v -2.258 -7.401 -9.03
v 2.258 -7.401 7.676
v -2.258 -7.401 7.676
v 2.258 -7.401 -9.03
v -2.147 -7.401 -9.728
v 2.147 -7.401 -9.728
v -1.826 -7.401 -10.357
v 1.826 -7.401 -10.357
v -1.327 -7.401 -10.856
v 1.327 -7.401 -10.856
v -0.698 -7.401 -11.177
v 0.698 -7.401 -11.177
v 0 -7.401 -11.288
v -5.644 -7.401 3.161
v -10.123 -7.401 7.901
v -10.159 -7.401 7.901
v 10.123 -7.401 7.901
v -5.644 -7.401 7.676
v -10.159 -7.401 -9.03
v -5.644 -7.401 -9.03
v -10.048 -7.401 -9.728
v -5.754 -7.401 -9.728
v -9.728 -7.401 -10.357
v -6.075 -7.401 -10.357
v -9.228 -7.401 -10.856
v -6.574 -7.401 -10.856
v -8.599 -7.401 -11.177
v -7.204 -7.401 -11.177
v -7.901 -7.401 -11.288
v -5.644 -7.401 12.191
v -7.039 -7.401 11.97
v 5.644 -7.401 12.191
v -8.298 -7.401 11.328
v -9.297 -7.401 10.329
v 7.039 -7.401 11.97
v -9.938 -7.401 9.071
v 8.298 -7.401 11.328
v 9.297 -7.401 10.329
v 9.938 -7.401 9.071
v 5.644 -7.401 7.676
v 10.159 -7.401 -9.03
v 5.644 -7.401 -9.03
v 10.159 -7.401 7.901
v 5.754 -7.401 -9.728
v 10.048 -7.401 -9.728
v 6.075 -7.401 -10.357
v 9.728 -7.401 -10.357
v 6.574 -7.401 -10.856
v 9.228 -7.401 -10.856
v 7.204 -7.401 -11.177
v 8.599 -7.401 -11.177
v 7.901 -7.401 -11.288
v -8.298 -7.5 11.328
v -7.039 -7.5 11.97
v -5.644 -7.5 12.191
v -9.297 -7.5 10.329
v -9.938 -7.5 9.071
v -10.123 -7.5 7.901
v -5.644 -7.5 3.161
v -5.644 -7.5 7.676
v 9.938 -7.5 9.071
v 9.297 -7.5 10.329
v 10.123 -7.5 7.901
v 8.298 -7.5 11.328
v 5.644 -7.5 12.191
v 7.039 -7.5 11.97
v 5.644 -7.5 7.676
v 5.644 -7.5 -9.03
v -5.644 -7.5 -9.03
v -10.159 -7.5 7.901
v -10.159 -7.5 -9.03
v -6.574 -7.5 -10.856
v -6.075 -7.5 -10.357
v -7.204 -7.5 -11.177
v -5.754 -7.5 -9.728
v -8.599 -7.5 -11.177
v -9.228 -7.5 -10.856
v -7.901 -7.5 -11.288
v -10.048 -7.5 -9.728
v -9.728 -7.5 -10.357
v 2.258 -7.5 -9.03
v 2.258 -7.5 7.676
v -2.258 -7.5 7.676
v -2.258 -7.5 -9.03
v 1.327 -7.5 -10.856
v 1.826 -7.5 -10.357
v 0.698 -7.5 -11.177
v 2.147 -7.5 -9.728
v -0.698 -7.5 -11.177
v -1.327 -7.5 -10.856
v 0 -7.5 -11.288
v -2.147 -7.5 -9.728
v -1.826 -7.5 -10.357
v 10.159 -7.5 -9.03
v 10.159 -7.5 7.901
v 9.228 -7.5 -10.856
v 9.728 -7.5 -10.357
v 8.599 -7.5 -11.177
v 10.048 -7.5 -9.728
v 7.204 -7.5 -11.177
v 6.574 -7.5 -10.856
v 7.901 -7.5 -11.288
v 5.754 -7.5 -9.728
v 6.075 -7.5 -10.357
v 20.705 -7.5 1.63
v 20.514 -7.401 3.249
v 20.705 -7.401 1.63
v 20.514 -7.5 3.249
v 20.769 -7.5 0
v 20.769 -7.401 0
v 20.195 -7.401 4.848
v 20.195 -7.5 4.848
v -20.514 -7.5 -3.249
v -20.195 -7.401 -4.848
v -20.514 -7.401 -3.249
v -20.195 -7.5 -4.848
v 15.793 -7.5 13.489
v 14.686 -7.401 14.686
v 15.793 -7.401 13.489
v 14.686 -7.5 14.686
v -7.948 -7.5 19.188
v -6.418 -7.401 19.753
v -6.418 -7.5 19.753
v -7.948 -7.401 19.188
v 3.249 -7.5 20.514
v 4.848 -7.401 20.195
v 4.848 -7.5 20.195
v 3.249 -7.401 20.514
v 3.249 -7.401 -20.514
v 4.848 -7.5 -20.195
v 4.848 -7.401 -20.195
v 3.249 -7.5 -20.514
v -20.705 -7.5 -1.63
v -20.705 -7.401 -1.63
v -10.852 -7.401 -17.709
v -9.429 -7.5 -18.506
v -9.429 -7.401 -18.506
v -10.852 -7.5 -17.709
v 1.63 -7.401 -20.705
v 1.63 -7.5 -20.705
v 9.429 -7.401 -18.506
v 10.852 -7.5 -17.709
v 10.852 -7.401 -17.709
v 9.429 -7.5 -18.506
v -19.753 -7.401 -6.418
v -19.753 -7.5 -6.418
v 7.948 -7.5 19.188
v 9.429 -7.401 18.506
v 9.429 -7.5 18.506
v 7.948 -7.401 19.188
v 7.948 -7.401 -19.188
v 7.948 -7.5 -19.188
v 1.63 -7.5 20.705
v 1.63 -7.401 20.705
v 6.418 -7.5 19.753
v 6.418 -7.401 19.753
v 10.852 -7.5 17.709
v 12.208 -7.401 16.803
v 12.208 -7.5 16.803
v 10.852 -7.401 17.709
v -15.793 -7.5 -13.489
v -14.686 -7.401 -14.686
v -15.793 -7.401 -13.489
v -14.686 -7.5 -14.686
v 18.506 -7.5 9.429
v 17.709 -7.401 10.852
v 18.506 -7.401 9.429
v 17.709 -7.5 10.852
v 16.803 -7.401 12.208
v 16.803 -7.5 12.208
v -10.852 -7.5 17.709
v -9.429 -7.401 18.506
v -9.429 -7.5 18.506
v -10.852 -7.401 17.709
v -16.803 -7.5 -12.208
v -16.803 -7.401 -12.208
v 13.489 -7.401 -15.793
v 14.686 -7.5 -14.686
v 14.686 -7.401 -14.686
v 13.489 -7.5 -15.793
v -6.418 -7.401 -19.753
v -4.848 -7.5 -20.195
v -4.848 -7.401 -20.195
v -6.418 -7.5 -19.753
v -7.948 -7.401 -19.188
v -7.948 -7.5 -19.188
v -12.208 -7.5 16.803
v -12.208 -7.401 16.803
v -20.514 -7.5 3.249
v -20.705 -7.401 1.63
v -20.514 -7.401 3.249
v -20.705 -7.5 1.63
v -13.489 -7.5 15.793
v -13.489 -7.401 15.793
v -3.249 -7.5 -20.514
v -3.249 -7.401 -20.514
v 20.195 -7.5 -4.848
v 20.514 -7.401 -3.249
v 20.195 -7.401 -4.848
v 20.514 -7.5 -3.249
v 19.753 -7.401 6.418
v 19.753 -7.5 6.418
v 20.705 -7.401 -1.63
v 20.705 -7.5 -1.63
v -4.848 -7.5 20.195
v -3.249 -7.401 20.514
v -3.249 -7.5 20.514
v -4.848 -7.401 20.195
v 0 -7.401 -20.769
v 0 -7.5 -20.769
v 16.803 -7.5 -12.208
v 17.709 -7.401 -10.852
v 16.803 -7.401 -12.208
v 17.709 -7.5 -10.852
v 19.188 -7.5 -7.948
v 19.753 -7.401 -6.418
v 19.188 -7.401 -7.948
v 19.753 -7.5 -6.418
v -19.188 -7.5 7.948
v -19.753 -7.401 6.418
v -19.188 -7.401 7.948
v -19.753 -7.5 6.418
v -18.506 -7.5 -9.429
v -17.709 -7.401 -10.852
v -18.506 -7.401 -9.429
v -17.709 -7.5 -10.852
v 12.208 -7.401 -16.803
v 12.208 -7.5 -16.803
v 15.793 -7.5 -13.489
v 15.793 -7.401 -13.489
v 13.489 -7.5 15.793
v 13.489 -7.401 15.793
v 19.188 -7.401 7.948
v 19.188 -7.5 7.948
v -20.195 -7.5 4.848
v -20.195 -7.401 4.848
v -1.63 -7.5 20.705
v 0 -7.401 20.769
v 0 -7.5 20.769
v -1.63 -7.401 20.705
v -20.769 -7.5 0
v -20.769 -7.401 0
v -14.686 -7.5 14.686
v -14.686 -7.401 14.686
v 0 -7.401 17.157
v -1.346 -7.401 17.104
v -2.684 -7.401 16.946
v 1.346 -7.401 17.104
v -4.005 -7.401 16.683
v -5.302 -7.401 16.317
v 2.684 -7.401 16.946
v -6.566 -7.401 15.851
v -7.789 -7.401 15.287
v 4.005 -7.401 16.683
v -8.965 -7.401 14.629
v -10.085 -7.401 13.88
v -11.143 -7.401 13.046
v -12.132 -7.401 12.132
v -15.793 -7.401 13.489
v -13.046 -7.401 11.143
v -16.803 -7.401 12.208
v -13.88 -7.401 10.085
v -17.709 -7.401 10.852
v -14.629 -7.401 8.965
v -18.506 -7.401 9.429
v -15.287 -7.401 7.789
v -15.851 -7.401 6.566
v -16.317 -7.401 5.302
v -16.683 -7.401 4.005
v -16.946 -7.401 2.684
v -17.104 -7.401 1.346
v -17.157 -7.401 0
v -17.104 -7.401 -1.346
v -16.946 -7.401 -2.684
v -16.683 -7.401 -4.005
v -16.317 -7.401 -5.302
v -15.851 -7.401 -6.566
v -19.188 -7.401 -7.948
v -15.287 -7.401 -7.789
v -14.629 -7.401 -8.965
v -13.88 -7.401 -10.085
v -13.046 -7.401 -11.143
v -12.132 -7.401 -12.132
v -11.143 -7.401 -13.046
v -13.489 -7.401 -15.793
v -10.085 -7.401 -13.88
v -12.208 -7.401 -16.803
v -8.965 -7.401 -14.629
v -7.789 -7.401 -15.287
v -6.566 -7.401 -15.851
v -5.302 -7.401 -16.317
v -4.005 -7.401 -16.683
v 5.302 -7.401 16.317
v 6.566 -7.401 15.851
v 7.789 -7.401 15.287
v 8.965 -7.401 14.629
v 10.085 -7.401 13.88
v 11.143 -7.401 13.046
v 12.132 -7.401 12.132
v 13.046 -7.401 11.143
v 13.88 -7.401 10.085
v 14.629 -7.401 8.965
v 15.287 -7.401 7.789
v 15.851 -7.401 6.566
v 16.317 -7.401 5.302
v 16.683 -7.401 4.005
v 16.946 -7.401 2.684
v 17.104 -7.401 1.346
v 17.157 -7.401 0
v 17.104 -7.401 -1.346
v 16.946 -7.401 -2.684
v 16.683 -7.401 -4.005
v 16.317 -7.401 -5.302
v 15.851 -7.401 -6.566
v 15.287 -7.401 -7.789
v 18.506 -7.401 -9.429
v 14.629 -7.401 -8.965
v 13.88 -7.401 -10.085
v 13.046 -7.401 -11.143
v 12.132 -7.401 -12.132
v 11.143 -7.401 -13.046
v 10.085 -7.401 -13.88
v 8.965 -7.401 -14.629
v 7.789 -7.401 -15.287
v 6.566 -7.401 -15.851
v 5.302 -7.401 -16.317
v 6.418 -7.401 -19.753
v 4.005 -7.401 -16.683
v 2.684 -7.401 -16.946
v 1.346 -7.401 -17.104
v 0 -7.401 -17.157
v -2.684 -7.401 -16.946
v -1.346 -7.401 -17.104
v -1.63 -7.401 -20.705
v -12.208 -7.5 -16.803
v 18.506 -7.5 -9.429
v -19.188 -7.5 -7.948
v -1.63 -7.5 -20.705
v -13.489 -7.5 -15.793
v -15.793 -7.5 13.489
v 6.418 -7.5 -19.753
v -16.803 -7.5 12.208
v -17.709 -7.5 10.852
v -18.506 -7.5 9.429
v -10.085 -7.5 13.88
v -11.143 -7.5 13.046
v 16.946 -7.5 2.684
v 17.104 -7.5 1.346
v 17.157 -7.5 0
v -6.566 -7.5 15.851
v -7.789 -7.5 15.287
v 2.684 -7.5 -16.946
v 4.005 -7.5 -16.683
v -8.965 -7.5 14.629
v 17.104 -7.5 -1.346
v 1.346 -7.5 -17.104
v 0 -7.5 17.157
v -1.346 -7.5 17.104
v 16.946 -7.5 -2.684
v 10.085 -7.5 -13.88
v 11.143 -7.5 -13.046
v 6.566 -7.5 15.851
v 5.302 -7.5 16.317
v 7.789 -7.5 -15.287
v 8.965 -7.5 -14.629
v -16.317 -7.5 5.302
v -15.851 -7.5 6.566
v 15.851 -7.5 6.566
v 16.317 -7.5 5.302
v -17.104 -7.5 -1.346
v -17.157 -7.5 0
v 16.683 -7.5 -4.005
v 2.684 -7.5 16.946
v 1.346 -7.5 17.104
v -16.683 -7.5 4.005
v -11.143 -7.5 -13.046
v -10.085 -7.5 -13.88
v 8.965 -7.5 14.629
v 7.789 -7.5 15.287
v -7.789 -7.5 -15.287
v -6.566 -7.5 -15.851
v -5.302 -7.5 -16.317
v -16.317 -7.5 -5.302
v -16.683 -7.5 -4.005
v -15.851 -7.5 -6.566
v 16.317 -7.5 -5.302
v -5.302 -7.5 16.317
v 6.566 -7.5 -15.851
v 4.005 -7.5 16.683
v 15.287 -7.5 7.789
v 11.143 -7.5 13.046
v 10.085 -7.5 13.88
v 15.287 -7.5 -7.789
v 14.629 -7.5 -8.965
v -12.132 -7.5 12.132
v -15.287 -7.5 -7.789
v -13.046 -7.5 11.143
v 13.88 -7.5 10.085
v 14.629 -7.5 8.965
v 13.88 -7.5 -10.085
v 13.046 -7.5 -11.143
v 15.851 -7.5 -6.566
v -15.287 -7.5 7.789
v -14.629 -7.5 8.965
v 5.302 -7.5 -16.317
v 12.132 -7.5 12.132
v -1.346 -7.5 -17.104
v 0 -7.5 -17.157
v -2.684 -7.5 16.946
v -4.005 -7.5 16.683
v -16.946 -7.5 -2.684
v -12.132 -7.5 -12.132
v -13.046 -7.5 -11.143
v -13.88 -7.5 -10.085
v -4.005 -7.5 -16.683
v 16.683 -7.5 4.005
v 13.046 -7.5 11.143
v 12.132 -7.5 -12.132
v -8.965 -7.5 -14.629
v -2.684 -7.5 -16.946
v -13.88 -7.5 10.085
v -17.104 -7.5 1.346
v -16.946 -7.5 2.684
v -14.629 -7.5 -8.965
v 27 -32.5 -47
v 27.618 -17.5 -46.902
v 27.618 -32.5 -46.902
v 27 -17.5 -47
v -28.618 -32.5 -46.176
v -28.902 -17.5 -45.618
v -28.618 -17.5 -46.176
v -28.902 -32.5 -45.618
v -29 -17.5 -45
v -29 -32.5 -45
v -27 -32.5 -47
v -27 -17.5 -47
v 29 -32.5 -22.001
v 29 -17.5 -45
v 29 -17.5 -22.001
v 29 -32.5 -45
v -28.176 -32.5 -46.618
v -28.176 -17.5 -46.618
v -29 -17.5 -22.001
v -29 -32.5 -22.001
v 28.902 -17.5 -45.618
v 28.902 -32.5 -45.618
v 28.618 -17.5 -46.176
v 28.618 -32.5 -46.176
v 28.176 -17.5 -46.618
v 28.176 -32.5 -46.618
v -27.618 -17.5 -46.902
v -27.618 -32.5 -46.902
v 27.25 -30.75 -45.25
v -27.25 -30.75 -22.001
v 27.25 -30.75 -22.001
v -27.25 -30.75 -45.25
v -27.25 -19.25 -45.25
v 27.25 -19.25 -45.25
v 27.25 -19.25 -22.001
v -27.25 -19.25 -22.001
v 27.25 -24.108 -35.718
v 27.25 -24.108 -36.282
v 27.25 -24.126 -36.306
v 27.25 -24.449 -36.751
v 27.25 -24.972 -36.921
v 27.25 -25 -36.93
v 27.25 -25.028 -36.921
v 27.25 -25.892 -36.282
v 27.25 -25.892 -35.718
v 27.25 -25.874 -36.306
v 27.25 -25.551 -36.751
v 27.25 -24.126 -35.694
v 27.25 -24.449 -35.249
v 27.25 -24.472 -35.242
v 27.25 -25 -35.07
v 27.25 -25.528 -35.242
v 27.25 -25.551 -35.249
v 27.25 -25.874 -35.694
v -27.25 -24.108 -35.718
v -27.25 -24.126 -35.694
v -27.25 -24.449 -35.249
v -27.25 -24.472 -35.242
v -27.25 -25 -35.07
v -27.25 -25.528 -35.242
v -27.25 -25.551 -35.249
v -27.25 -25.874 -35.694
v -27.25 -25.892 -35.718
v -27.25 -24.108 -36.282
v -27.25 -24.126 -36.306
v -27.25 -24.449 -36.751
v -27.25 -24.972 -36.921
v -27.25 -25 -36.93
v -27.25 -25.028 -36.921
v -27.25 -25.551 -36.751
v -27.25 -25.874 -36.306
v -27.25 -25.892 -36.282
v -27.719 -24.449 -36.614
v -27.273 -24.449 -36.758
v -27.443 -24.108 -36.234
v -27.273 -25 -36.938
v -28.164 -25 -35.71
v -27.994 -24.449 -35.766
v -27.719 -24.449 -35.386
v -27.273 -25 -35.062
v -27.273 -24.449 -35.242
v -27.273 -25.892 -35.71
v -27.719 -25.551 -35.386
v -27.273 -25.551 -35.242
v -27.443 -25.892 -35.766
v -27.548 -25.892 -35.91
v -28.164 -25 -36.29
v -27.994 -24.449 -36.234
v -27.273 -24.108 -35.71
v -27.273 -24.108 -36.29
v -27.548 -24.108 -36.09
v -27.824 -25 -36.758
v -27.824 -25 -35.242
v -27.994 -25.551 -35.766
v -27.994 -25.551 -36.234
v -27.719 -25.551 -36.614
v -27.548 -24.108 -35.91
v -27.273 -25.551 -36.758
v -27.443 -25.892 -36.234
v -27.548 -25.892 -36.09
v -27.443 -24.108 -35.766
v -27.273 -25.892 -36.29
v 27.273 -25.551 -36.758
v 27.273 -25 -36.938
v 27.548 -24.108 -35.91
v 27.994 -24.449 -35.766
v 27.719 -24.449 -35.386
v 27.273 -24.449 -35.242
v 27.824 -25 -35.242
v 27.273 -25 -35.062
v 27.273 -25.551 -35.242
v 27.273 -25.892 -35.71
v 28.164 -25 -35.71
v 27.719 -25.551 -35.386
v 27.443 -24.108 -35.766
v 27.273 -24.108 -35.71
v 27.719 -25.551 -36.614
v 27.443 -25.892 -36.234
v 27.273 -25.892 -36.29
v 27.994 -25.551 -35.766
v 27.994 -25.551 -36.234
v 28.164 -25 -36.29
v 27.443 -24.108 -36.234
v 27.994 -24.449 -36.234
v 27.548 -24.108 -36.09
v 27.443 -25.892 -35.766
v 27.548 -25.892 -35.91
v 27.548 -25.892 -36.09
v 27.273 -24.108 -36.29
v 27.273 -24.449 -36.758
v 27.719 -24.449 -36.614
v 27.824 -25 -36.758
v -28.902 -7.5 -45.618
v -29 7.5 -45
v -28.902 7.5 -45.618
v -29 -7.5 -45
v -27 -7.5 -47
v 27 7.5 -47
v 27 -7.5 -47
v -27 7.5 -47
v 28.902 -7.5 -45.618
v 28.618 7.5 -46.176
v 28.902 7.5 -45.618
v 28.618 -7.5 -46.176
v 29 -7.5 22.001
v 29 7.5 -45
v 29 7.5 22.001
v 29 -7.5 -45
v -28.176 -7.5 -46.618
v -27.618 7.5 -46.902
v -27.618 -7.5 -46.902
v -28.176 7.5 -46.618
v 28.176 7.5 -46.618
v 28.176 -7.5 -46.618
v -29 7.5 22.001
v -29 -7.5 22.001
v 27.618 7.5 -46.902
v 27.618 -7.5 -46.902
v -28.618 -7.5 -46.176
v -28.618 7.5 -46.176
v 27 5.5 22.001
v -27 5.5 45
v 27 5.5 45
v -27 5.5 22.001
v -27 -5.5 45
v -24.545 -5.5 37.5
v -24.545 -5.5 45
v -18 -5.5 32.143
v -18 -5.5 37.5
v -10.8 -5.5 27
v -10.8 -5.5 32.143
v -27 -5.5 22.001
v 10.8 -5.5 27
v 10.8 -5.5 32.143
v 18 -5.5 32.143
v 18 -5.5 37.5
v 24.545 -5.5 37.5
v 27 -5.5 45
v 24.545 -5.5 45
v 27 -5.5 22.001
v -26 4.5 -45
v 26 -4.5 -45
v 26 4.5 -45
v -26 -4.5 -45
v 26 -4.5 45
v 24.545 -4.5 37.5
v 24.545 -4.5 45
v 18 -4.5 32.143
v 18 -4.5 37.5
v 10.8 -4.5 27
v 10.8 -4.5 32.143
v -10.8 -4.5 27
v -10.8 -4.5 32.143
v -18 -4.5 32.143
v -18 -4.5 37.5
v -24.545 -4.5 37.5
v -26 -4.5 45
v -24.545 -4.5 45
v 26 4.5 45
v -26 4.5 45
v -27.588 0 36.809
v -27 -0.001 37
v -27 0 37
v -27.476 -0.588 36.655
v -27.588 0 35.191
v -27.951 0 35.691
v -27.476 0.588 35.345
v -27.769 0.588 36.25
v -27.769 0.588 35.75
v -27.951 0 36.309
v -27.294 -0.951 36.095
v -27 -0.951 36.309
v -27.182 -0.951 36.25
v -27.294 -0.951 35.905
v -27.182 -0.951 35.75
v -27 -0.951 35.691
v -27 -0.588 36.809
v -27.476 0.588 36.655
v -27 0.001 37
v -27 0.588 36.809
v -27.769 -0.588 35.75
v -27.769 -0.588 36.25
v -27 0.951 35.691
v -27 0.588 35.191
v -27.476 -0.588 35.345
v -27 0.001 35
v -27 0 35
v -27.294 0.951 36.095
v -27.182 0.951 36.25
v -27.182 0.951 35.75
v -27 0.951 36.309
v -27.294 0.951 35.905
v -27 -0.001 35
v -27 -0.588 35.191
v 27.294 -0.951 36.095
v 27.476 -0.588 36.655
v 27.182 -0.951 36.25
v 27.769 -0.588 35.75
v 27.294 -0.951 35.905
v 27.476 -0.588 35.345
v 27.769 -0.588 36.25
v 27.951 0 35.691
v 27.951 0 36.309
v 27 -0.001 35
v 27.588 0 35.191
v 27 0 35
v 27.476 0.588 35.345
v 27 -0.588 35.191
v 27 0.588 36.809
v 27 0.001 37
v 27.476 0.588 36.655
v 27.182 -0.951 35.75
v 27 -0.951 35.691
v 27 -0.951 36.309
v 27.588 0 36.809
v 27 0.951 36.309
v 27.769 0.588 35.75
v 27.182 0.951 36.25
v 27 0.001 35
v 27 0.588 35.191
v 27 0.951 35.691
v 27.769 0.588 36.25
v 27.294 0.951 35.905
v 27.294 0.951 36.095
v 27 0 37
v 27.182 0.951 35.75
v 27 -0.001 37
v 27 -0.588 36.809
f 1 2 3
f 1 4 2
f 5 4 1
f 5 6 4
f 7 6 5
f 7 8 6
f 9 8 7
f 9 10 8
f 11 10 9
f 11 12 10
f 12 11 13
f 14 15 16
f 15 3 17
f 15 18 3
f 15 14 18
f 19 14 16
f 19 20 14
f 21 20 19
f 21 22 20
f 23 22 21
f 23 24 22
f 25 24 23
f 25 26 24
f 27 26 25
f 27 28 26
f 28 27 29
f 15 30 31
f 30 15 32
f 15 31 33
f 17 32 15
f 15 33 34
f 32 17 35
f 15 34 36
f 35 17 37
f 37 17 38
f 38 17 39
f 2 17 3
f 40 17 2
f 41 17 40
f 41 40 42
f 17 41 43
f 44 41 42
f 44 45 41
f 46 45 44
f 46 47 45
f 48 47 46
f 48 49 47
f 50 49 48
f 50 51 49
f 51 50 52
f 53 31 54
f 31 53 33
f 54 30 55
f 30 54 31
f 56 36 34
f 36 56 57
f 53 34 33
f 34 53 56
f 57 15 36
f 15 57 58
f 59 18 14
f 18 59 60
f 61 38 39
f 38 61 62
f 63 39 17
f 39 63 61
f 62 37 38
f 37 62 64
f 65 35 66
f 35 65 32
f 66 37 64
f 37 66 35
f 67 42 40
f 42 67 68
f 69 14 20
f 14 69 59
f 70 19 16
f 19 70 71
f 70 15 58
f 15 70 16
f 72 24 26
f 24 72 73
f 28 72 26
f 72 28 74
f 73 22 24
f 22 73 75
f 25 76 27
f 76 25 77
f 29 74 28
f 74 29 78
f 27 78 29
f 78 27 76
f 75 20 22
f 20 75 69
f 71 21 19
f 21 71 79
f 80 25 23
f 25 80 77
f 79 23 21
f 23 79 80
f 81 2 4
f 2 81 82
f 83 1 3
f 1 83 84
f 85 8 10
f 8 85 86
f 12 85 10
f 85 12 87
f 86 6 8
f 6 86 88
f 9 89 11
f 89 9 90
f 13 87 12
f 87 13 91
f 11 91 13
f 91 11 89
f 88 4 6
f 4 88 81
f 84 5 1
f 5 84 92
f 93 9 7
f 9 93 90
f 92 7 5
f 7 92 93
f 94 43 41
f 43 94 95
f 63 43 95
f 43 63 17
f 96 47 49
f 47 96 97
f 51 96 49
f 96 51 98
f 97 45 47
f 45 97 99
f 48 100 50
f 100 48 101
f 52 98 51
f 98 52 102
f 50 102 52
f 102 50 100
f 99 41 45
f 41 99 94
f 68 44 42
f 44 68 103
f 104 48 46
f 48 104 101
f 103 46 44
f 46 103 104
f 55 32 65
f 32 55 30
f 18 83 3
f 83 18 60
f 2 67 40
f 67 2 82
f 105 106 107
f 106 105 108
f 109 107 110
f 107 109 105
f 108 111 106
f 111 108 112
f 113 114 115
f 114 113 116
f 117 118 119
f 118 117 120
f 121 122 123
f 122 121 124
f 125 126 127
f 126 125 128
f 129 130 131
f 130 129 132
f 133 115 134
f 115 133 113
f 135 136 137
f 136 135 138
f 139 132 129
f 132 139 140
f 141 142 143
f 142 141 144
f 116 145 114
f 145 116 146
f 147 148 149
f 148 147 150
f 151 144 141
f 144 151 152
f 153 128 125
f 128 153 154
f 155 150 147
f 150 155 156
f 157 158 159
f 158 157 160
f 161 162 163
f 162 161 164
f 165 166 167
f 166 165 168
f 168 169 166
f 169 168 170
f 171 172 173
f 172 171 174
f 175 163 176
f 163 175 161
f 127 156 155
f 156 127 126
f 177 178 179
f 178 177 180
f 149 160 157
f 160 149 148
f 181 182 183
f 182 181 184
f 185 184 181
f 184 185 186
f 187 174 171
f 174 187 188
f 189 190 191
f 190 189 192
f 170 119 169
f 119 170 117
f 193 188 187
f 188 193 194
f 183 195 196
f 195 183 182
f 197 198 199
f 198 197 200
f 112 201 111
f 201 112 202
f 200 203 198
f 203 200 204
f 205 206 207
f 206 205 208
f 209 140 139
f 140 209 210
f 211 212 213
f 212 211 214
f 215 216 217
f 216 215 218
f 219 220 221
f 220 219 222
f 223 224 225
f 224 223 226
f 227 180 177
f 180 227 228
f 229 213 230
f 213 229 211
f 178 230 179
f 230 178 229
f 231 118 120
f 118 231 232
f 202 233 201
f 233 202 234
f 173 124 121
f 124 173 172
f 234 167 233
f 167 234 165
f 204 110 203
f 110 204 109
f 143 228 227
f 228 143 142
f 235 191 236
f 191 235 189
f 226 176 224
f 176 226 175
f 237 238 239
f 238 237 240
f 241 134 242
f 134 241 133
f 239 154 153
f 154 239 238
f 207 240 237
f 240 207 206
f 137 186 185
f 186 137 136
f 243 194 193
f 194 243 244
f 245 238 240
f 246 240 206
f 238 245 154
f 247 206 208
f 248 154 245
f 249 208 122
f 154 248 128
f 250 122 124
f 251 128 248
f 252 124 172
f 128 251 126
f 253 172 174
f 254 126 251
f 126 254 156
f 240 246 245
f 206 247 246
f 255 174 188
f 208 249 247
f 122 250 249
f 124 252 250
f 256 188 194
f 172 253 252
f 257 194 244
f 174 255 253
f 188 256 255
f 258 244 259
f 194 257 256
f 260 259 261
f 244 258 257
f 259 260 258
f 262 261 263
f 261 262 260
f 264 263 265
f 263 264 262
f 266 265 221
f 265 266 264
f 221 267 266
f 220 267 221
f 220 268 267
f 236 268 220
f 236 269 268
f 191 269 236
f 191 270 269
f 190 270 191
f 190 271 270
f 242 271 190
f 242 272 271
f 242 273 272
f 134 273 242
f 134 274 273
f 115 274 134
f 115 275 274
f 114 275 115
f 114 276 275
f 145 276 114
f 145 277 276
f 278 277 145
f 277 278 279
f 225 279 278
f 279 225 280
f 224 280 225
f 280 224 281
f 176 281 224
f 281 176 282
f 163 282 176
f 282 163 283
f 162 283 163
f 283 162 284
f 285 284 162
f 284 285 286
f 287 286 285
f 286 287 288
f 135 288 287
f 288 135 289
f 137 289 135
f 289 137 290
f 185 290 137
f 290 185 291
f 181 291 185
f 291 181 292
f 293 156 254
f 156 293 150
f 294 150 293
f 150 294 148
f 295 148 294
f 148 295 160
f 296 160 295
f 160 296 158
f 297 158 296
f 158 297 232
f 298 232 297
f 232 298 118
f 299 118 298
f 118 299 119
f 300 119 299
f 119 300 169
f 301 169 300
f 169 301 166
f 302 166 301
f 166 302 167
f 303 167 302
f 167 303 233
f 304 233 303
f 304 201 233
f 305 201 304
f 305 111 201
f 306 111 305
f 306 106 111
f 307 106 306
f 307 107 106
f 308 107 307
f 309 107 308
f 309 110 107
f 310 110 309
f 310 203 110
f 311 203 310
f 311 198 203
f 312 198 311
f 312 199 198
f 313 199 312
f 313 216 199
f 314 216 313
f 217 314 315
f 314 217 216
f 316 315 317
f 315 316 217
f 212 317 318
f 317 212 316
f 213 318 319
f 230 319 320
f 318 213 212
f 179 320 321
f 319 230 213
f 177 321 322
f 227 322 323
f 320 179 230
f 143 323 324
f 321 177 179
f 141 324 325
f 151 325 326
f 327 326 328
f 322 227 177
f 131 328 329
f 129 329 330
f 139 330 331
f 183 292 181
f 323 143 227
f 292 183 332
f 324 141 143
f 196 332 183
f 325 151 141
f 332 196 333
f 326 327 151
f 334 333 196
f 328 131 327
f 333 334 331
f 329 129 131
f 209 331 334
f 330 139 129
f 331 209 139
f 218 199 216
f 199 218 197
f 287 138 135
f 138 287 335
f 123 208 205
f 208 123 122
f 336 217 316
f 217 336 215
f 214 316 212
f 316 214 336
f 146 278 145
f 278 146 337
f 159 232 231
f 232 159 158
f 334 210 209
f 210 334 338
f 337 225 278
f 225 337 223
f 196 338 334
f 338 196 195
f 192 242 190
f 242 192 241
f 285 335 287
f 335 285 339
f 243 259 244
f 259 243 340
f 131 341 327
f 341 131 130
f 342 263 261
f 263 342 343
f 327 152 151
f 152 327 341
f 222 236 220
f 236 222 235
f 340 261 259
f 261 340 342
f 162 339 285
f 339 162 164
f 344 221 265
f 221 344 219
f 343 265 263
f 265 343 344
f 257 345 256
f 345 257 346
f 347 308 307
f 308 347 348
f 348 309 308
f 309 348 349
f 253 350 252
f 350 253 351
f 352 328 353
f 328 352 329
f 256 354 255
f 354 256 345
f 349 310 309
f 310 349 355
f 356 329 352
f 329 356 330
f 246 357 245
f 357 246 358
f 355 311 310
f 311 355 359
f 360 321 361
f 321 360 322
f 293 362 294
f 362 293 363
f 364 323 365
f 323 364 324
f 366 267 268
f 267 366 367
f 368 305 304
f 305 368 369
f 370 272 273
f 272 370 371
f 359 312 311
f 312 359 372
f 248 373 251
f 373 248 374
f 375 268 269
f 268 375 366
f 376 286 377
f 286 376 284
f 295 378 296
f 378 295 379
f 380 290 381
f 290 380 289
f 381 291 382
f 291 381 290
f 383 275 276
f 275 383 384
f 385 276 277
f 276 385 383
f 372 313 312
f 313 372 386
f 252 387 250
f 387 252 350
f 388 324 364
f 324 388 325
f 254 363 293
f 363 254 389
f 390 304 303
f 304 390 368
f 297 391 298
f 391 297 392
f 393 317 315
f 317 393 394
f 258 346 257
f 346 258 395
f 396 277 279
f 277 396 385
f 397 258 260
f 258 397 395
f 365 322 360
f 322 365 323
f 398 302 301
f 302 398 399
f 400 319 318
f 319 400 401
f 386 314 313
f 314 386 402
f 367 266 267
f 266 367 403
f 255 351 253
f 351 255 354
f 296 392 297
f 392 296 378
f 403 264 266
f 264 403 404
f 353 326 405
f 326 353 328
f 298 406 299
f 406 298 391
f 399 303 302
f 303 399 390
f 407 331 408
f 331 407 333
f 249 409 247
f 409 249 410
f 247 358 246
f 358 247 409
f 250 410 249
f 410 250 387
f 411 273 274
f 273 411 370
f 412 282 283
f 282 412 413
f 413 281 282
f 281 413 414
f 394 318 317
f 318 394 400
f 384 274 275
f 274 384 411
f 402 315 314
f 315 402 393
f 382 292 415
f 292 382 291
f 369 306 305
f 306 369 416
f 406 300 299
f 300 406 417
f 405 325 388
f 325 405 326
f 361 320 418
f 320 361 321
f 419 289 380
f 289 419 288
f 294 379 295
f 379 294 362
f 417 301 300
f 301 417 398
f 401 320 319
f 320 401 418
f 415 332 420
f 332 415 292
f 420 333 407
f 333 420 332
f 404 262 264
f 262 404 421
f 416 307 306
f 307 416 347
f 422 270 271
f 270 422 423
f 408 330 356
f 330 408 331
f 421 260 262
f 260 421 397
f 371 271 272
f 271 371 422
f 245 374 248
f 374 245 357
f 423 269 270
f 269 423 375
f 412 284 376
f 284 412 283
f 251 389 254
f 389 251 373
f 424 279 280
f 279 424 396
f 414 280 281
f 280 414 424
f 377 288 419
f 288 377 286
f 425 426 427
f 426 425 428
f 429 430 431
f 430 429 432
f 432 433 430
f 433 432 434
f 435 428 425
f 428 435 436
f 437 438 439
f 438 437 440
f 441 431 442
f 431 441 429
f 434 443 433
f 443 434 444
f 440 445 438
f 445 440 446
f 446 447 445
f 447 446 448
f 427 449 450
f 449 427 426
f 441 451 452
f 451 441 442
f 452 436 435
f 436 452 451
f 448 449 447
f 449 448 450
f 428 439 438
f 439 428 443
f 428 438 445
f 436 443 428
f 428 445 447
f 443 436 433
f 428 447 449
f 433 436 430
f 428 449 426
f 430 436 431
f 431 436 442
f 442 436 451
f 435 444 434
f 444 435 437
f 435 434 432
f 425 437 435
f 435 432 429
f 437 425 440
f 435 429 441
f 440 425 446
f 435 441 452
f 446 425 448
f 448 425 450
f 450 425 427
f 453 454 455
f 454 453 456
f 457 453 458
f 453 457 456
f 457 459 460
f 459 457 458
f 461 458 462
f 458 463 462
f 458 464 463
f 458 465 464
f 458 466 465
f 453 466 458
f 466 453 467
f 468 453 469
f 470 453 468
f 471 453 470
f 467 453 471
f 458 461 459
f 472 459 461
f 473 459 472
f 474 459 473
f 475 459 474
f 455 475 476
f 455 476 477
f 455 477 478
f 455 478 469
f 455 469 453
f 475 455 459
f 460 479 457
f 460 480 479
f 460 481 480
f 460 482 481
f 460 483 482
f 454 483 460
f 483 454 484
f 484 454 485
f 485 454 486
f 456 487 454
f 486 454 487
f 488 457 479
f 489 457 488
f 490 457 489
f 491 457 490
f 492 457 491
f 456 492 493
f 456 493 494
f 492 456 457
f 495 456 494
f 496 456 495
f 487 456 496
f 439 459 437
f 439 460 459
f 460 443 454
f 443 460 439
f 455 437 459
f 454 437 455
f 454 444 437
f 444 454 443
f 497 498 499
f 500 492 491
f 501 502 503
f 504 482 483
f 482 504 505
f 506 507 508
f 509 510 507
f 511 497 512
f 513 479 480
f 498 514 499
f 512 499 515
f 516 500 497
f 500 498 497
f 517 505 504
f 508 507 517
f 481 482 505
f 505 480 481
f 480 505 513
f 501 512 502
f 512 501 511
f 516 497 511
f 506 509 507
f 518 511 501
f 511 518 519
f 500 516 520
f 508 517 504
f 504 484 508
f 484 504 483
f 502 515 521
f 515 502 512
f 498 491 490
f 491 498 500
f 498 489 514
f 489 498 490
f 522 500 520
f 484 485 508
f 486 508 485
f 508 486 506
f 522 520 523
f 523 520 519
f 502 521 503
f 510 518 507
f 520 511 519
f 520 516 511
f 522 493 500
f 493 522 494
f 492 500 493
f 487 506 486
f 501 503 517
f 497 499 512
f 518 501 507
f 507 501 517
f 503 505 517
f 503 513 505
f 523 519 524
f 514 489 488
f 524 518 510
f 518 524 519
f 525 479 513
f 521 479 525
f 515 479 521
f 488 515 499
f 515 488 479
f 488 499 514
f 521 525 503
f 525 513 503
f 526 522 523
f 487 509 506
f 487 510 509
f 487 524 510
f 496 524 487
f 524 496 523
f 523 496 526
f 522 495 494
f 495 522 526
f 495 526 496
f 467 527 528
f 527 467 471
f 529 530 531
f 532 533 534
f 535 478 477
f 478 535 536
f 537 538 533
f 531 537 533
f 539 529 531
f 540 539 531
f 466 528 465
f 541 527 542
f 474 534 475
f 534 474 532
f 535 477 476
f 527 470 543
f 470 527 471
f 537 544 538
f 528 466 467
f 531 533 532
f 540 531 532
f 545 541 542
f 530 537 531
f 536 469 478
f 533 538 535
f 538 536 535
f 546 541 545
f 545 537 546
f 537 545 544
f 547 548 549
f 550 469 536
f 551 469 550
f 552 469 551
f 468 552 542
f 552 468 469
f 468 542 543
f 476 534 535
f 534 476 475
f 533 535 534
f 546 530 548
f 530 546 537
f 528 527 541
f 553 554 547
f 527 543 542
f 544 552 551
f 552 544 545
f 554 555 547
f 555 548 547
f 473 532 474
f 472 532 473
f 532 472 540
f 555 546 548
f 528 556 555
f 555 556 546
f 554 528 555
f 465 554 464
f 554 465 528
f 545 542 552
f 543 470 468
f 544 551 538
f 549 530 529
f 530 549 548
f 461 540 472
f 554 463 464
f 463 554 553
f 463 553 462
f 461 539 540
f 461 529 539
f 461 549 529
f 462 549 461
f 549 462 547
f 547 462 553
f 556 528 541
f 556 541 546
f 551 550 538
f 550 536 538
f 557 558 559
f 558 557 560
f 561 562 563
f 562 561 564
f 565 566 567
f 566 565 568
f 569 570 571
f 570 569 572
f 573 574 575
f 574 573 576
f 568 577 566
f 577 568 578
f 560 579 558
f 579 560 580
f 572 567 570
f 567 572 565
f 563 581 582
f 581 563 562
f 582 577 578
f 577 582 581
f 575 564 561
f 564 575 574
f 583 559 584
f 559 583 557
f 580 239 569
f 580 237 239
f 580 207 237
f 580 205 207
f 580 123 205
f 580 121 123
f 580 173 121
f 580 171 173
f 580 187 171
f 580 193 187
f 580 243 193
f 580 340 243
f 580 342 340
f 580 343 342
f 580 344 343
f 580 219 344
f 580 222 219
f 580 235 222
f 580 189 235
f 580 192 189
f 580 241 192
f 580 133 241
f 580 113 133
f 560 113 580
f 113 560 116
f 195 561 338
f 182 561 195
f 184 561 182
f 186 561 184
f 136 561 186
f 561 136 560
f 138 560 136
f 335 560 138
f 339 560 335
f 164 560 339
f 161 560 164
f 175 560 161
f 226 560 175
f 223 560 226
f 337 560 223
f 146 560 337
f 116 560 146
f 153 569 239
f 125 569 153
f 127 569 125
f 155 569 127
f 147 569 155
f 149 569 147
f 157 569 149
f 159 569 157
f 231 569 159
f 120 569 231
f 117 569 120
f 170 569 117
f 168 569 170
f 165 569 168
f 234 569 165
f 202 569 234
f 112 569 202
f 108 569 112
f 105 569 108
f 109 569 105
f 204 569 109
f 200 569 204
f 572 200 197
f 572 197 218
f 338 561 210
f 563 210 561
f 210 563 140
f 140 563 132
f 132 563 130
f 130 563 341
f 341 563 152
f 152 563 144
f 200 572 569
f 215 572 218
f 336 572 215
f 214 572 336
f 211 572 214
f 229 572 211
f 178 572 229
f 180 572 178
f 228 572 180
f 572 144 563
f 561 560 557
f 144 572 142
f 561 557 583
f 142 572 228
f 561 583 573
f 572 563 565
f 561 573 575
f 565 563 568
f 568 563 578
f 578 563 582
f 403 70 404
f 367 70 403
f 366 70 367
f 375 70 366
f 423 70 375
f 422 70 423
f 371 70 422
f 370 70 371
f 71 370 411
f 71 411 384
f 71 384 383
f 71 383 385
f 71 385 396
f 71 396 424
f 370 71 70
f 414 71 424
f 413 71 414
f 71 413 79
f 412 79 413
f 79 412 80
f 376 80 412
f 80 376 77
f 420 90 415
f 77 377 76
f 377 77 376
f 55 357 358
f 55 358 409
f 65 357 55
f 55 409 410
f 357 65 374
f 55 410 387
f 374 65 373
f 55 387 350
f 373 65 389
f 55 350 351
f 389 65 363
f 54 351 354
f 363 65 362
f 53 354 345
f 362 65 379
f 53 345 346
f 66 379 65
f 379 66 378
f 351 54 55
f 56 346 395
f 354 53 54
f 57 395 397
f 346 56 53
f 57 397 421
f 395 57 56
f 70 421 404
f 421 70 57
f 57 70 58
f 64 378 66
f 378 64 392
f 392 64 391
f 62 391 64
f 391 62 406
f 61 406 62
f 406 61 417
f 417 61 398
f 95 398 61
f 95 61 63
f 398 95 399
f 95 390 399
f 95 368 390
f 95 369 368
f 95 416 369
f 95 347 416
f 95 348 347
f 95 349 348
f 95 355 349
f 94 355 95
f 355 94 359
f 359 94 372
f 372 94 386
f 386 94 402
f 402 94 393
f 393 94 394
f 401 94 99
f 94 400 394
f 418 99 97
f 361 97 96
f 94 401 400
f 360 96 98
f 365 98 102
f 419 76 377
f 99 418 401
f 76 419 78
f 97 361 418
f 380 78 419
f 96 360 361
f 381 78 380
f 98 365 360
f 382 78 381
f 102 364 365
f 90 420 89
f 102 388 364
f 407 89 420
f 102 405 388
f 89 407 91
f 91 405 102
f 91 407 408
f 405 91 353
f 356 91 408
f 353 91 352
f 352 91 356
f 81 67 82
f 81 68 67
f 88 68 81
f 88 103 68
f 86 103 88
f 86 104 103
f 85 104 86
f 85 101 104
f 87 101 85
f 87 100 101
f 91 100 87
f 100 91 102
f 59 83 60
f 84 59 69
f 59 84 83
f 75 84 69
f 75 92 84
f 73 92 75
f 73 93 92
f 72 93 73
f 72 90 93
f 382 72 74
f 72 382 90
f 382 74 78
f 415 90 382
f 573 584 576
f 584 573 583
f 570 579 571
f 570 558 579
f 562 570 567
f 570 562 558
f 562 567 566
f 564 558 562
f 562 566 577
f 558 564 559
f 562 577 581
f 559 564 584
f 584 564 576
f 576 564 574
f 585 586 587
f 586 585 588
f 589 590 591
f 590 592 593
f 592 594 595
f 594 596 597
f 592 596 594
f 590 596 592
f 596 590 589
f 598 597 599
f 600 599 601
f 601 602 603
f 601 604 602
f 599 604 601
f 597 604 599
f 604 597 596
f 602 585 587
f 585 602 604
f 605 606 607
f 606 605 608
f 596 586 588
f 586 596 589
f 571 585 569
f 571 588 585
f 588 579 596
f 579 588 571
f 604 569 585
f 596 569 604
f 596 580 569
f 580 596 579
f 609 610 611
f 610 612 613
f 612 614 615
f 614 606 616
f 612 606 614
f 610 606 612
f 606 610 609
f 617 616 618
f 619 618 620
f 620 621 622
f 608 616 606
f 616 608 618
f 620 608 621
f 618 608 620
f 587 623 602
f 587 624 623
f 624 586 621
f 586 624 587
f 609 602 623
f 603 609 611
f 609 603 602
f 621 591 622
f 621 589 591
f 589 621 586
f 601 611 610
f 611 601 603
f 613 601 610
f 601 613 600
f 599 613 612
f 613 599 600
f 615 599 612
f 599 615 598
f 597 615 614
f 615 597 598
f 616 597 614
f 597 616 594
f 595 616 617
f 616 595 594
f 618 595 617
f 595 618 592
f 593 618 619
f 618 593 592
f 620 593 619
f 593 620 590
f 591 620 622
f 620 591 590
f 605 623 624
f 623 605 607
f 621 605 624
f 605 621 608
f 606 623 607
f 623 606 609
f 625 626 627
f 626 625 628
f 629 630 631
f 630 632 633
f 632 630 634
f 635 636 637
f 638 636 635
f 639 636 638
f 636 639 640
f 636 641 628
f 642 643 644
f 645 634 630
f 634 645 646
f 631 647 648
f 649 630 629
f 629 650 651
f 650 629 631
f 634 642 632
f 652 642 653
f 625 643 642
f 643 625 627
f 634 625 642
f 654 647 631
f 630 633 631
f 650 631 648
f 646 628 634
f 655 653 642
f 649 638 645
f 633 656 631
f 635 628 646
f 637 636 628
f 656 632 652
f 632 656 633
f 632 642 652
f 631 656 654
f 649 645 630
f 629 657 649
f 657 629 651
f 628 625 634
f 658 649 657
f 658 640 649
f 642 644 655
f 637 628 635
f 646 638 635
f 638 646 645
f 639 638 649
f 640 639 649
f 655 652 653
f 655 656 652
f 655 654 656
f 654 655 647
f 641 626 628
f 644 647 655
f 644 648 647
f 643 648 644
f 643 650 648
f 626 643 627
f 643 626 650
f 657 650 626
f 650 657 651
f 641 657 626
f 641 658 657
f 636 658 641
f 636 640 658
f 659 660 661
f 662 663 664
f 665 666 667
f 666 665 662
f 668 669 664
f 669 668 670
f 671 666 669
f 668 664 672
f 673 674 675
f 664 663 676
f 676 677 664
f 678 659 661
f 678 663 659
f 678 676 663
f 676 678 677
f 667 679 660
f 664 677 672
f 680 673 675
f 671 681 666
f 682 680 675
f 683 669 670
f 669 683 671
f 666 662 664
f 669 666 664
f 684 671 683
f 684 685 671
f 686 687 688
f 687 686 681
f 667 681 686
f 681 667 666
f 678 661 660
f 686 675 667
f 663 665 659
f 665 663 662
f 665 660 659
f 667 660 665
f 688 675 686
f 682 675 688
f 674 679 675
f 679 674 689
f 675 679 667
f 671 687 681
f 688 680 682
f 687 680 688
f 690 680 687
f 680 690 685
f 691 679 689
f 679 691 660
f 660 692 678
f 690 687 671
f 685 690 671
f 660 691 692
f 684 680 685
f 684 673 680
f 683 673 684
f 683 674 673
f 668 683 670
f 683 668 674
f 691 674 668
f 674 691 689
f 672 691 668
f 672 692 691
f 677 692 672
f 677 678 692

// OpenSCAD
/* [Global] */

/* [Card] */
//How many cards would you like to hold?
card_number = 15;
//How long is your card?
card_length = 89.22;
//How wide is your card?
card_width = 51.1;
//How thick is your card?
card_thickness = .5;

/* [Box] */
wall_thickness = 2; //[2:1:10]
corner_style = "Rounded"; //[Rounded,Angled,None]

/* [Logo] */
logo_style = "MakerBot Logo"; //[MakerBot Logo,Heart,Star,Draw Your Own,None]
logo_size = 20; //[1:1:50]
logo_depth = .1; //[.1:.1:1]

/* [Star] */
//This will only affect the "Star" logo style.
star_border_thickness = 15; //[0:1:50]

/* [Draw] */
//Draw your own logo using the canvas below. WARNING: This feature is experimental, and may be a big buggy!
draw_a_logo =  [[[-30.607849,-48.473831],[-38.714745,-48.950043],[-40.559818,-48.486679],[-42.201851,-47.493645],[-47.306175,-42.282654],[-50.067959,-38.508476],[-47.496841,-39.749046],[-46.892071,-39.806171],[-46.653542,-39.556297],[-49.260830,-36.213120],[-49.681732,-34.902710],[-49.585598,-33.782043],[-49.138451,-33.165283],[-48.672112,-33.207165],[-46.200596,-35.658916],[-47.279457,-33.120216],[-47.321926,-32.230251],[-46.990898,-31.375122],[-45.878410,-30.094749],[-43.224831,-28.013985],[-42.217957,-27.615326],[-41.118553,-27.667067],[-40.805717,-27.398746],[-40.440659,-25.661360],[-39.173859,-13.378041],[-37.786060,-6.545761],[-36.585690,-3.203835],[-34.921036,-0.177278],[-32.697136,2.334522],[-31.352158,3.341671],[-28.276741,4.879042],[-24.862782,5.878342],[-21.320715,6.457005],[-16.227745,6.793123],[-6.193724,6.651176],[-3.917368,6.182596],[1.149520,4.628635],[3.496422,4.354591],[5.367534,4.861082],[8.187830,6.665401],[10.588829,7.390333],[11.411912,7.954811],[11.835903,9.095350],[12.399237,12.947439],[13.889902,16.162262],[13.933737,17.683546],[13.316607,19.065596],[11.898010,21.208532],[6.859921,27.302176],[5.617778,29.462534],[5.115950,31.361303],[3.388903,42.964180],[3.273381,46.066513],[3.726890,48.114418],[4.978456,49.315399],[7.242655,49.967201],[8.609360,50.079552],[9.707384,49.859634],[11.739238,48.611275],[14.175842,46.044868],[16.663437,42.226387],[17.125431,47.022690],[17.457367,48.010414],[17.989151,48.348061],[19.181324,47.905319],[24.528868,44.299988],[25.586594,43.349907],[26.602041,41.795021],[27.508392,39.332878],[29.795576,26.542974],[30.282230,24.476656],[31.117352,22.414083],[31.720629,21.625368],[32.642006,21.057058],[35.131134,20.683912],[36.914520,20.059973],[39.043831,18.184668],[42.450657,14.071085],[46.617176,8.405781],[48.564854,5.175398],[49.817593,2.084951],[50.067959,0.425432],[49.656380,-0.983798],[48.150597,-2.837172],[45.817619,-4.786176],[42.303886,-6.914544],[36.506889,-8.046309],[35.342590,-8.523187],[34.626579,-9.248261],[34.336266,-10.490269],[34.565552,-12.031119],[35.052368,-13.404231],[37.089733,-17.042198],[37.317879,-18.115067],[37.155357,-19.071182],[35.604301,-21.320902],[33.913990,-23.043991],[33.883816,-28.314064],[33.082306,-30.108660],[31.550901,-32.176041],[30.204401,-33.504837],[26.342428,-35.397213],[25.570063,-36.226906],[25.784672,-37.377975],[26.657942,-38.691196],[35.016315,-47.244415],[36.307613,-48.865204],[36.517559,-49.673759],[35.642605,-50.079552],[30.526541,-50.070801],[27.432796,-49.786285],[24.770382,-49.194931],[21.059244,-47.649162],[13.547039,-43.090836],[12.276370,-42.541962],[10.688703,-42.258522],[3.786492,-43.914528],[2.470330,-44.603432],[2.196272,-45.124454],[2.270218,-46.117500],[3.513528,-49.225983],[3.376098,-49.617065],[2.794866,-49.836327],[-5.766325,-50.020004],[-18.879635,-49.768524],[-25.214447,-49.130280],[-29.151905,-47.714996],[-30.600498,-48.472359]],[[0,1,2,3,4,5,6,7,8,9,10,11,12,13,14,15,16,17,18,19,20,21,22,23,24,25,26,27,28,29,30,31,32,33,34,35,36,37,38,39,40,41,42,43,44,45,46,47,48,49,50,51,52,53,54,55,56,57,58,59,60,61,62,63,64,65,66,67,68,69,70,71,72,73,74,75,76,77,78,79,80,81,82,83,84,85,86,87,88,89,90,91,92,93,94,95,96,97,98,99,100,101,102,103,104,105,106,107,108,109,110,111,112,113,114,115,116,117,118,119,120,121,122,123,124,125,126,127]]]; //[draw_polygon:100x100]

/* [Hidden] */

//The thickness of the border around the inside of the box which locks into the top piece.
border_thickness = wall_thickness/2; //[1:1:5]


/* [Upload] */ //IF YOU PUT THIS BACK IN, REMEMBER TO ADD IT TO LOGO_STYLE
// Upload a 100x100 pixel image (images will be automatically stretched to fit). Simple, high contrast images like logos work best.
//upload_image = "testimage_invert.dat"; // [image_surface:100x100]

inner_length = ceil(card_length); //Card is 89.22mm
inner_width = ceil(card_width) + (border_thickness * 2); //Card is 51.10mm
inner_height = ((card_thickness * 1.2) * card_number) + (border_thickness * 2); //Card is .5mm
frontcut1_length = inner_length / 6;
frontcut1_width = inner_width / 1.1;
frontcut2_length = inner_length / 3.5;
frontcut2_width = inner_width / 1.5;
frontcut3_length = inner_length / 2.5;
frontcut3_width = inner_width / 2.5;
top_height = (inner_length + wall_thickness) / 4;
top_fit = 4;
logo_xy = logo_size * (inner_width / 26);
MBM_height = 60;
MBM_thickness = 1;
MBM_radius = MBM_height/5.5;
function lookup_rez(wall_thickness) = floor(lookup(wall_thickness,[[2,10],[10,20]]));
e = .001; //epsilon

rotate([90,90,0]){
    TopFinal();
    BottomFinal();
}

/* Modules */

module TopFinal(){
    translate([0,0,(inner_height + (wall_thickness * 2)) + 10]){
        rotate([0,180,0]){
            difference(){
                TopLocked();
                translate([0,0,((inner_height/2) + wall_thickness + (wall_thickness/4)) - logo_depth + e]){
                    if(logo_style == "MakerBot Logo"){
                        MakerbotLogo();
                    }
                    if(logo_style == "Heart"){
                        HeartLogo();
                    }
                    if(logo_style == "Star"){
                        StarLogo();
                    }
                    if(logo_style == "Upload An Image"){
                        UploadedLogo();
                    }
                    if(logo_style == "Draw Your Own"){
                        DrawnLogo();
                    }
                }
            }
        }
    }
}
module BottomFinal(){
    difference(){
        BottomLocked();
        translate([0,0,((inner_height/2) + wall_thickness + (wall_thickness/4)) - logo_depth + e]){
            if(logo_style == "MakerBot Logo"){
                MakerbotLogo();
            }
            if(logo_style == "Heart"){
                HeartLogo();
            }
            if(logo_style == "Star"){
                StarLogo();
            }
            if(logo_style == "Upload An Image"){
                UploadedLogo();
            }
            if(logo_style == "Draw Your Own"){
                DrawnLogo();
            }
        }
    }
}
module HeartLogo(){
    resize([logo_xy,logo_xy,wall_thickness/2]){
        translate([1.5,0,0]){
            rotate([0,0,135]){
                linear_extrude(height = 1, center = true){
                    square([20,20], center = true);
                    translate([0, 10, 0]){
                        circle(r = 10);
                    }
                    translate([10, 0, 0]){
                        circle(r = 10);
                    }
                }
            }
        }
    }
}
module DrawnLogo(){
    scale([logo_xy/100,logo_xy/100,wall_thickness/2]){
        rotate([0,0,90]){
            linear_extrude(height = 1, center = true){
                polygon(points = draw_a_logo[0], paths = draw_a_logo[1], center = true);
            }
        }
    }
}
//module UploadedLogo(){
//    resize([logo_xy,logo_xy,wall_thickness/2]){
//        translate([0,0,-.25]){
//            difference(){
//                surface(file = upload_image, center = true);
//                translate([0,0,-.5]){
//                    cube([100,100,1],center = true);
//                }
//            }
//        }
//    }
//}
module StarLogo(){
    resize([logo_xy,logo_xy,wall_thickness/2]){
        difference(){
            cylinder($fn = 3, r = 50, h = 1, center = true);
            cylinder($fn = 3, r = 50 - star_border_thickness, h = 1, center = true);
        }
        rotate([0,0,180]){
            difference(){
                cylinder($fn = 3, r = 50, h = 1, center = true);
                cylinder($fn = 3, r = 50 - star_border_thickness, h = 1, center = true);
            }
        }
    }
}
module MakerbotLogo(){
	resize([logo_xy,logo_xy,wall_thickness/2]){
        rotate([0,0,90]){
            translate([-1.25*MBM_radius,1.5*MBM_radius,-MBM_thickness/2]){
                translate([0,MBM_radius * 0.2,]){
                    difference(){
                        cylinder(r=MBM_radius,h = MBM_thickness, $fn=20);
                        translate([0,-1*MBM_radius,0]){
                            cube([MBM_radius,MBM_radius,MBM_thickness]);
                        }
                    }
                }
                translate([2.5*MBM_radius,MBM_radius * 0.2,0]){
                    difference(){
                        cylinder(r=MBM_radius,h = MBM_thickness, $fn=20);
                        translate([-1*MBM_radius,-1*MBM_radius,0]){
                            cube([MBM_radius,MBM_radius,MBM_thickness]);
                        }
                    }
                }
                translate([-1*MBM_radius,0,0]){
                    translate([0,-3.5*MBM_radius,0]){
                        cube([MBM_radius,3.75*MBM_radius,MBM_thickness]);
                    }
                    translate([MBM_radius/2,-3.5*MBM_radius,0]){
                        cylinder(r=MBM_radius/2,h=MBM_thickness, $fn=20);
                    }
                }
                translate([0.75*MBM_radius,0,0]){
                    translate([0,-3.5*MBM_radius,0]){
                        cube([MBM_radius,3.75*MBM_radius,MBM_thickness]);
                    }
                    translate([MBM_radius/2,-3.5*MBM_radius,0]){
                        cylinder(r=MBM_radius/2,h=MBM_thickness, $fn=20);
                    }
                }
                translate([2.5*MBM_radius,0,0]){
                    translate([0,-3.5*MBM_radius,0]){
                        cube([MBM_radius,3.75*MBM_radius,MBM_thickness]);
                    }
                    translate([MBM_radius/2,-3.5*MBM_radius,0]){
                        cylinder(r=MBM_radius/2,h=MBM_thickness, $fn=20);
                    }
                }
                translate([0,MBM_radius * 0.2,0]){
                    cube([2.5*MBM_radius,MBM_radius,MBM_thickness]);
                }
            }
            difference(){
                cylinder(r = MBM_radius * 4.6, h = MBM_thickness, center = true, $fn = 80);
                cylinder(r = MBM_radius * 3.8, h = MBM_thickness + e, center = true, $fn = 80);
            }
        }
    }
}
module BottomLocked(){
    BottomRaw();
    translate([-inner_length/2.5,-inner_width/2,0]){
        difference(){
            sphere($fn = lookup_rez(wall_thickness), r = wall_thickness/2);
            translate([0,wall_thickness/2,0]){
                cube([wall_thickness + e,wall_thickness + e,wall_thickness + e], center = true);
            }
        }
    }
    translate([-inner_length/2.5,inner_width/2,0]){
        difference(){
            sphere($fn = lookup_rez(wall_thickness), r = wall_thickness/2);
            translate([0,-wall_thickness/2,0]){
                cube([wall_thickness + e,wall_thickness + e,wall_thickness + e], center = true);
            }
        }
    }
}
module TopLocked(){
    difference(){
        TopRaw();
        union(){
            translate([-inner_length/2.5,-inner_width/1.98,0]){
//                if((border_thickness - wall_thickness) >= 3){
//                    sphere($fn = 20, r = inner_height/8 - ((border_thickness - wall_thickness)/3));
//                } else {
//                    sphere($fn = 20, r = inner_height/8);
//                }
                sphere($fn = lookup_rez(wall_thickness), r = inner_height/16 - ((border_thickness - wall_thickness)/4));
            }
            translate([-inner_length/2.5,inner_width/1.98,0]){
//                if((border_thickness - wall_thickness) >= 3){
//                    sphere($fn = 20, r = inner_height/8 - ((border_thickness - wall_thickness)/3));
//                } else {
//                    sphere($fn = 20, r = inner_height/8);
//                }
                sphere($fn = lookup_rez(wall_thickness), r = inner_height/16 - ((border_thickness - wall_thickness)/4));
            }
        }
    }
}
module Border(){
    //Front secton, stepped
    translate([0,0,(inner_height/2) - (border_thickness/2)]){
        linear_extrude(height = border_thickness, center = true){
            difference(){
                square([inner_length,inner_width], center = true);
                translate([-inner_length/2,0,0]){
                    square([frontcut1_length,frontcut1_width], center = true);
                }
                translate([-inner_length/2,0,0]){
                    square([frontcut2_length,frontcut2_width], center = true);
                }
                translate([-inner_length/2,0,0]){
                    square([frontcut3_length,frontcut3_width], center = true);
                }
            }
        }
    }
    //Back section
    translate([0,0,-(inner_height/2) + (border_thickness/2)]){
        linear_extrude(height = border_thickness, center = true){
            square([inner_length,inner_width], center = true);
        }
    }
    //Left section
    translate([0,-(inner_width/2) + (border_thickness/2),0]){
        rotate([90,0,0]){
            linear_extrude(height = border_thickness, center = true){
                square([inner_length,inner_height], center = true);
            }
        }
    }
    //Right section
    translate([0,(inner_width/2) - (border_thickness/2),0]){
        rotate([90,0,0]){
            linear_extrude(height = border_thickness, center = true){
                square([inner_length,inner_height], center = true);
            }
        }
    }
}

module BottomRaw(){
    intersection(){
        difference(){
            linear_extrude(height = inner_height + (wall_thickness * 2), center = true){
                if(corner_style == "Rounded"){
                    offset($fn = 20, r = wall_thickness){
                        square([inner_length,inner_width], center = true);
                    }
                }
                if(corner_style == "Angled"){
                    offset($fn = 20, delta = wall_thickness, chamfer = true){
                        square([inner_length,inner_width], center = true);
                    }
                }
                if(corner_style == "None"){
                    offset($fn = 20, delta = wall_thickness){
                        square([inner_length,inner_width], center = true);
                    }
                }
            }
            InnerBoxFull();
        }
        translate([top_height,0,0]){
            cube([inner_length + (e * 2),inner_width + (wall_thickness * 2) + (e * 2),inner_height + (wall_thickness * 2) + (e * 2)], center = true);
        }
    }
    Border();
}
module TopRaw(){
    difference(){
        difference(){
            linear_extrude(height = inner_height + (wall_thickness * 2), center = true){
                if(corner_style == "Rounded"){
                    offset($fn = 20, r = wall_thickness){
                        square([inner_length,inner_width], center = true);
                    }
                }
                if(corner_style == "Angled"){
                    offset($fn = 20, delta = wall_thickness, chamfer = true){
                        square([inner_length,inner_width], center = true);
                    }
                }
                if(corner_style == "None"){
                    offset($fn = 20, delta = wall_thickness){
                        square([inner_length,inner_width], center = true);
                    }
                }
            }
            resize([inner_length + (wall_thickness / top_fit),inner_width + (wall_thickness / top_fit),inner_height + (wall_thickness / top_fit)]){
                InnerBoxFull();
            }
        }
        translate([top_height,0,0]){
            cube([inner_length + (e * 2),inner_width + (wall_thickness * 2) + (e * 2),inner_height + (wall_thickness * 2) + (e * 2)], center = true);
        }
    }
}
module InnerBoxFull(){
    linear_extrude(height = inner_height, center = true){
        square([inner_length,inner_width], center = true);
    }
}
